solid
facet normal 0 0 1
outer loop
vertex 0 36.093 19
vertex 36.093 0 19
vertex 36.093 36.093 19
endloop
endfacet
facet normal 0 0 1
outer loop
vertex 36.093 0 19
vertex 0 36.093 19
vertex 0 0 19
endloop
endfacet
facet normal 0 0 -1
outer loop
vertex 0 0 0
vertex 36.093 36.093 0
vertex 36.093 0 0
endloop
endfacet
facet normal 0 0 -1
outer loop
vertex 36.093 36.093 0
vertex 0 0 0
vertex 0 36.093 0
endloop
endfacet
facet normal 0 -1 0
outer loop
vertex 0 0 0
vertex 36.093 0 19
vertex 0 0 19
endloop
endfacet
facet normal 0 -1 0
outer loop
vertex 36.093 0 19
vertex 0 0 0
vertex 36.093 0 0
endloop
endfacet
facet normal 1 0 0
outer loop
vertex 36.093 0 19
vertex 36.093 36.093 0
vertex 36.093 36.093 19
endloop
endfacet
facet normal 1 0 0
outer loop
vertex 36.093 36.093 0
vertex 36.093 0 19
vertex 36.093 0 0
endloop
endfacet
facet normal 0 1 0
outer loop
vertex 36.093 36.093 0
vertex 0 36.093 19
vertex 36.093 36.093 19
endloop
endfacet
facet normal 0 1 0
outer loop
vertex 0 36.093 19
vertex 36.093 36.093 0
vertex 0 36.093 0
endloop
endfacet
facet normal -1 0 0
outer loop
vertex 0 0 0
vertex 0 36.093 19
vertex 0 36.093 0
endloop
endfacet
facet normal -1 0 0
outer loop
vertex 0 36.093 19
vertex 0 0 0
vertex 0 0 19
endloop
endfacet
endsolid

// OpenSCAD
cube([36.09336, 36.09336, 19]);
translate([1.039, 0.820, 0])
    linear_extrude(height = 23.56, convexity = 5)
        import(file = "coeur.dxf", layer = "0");
